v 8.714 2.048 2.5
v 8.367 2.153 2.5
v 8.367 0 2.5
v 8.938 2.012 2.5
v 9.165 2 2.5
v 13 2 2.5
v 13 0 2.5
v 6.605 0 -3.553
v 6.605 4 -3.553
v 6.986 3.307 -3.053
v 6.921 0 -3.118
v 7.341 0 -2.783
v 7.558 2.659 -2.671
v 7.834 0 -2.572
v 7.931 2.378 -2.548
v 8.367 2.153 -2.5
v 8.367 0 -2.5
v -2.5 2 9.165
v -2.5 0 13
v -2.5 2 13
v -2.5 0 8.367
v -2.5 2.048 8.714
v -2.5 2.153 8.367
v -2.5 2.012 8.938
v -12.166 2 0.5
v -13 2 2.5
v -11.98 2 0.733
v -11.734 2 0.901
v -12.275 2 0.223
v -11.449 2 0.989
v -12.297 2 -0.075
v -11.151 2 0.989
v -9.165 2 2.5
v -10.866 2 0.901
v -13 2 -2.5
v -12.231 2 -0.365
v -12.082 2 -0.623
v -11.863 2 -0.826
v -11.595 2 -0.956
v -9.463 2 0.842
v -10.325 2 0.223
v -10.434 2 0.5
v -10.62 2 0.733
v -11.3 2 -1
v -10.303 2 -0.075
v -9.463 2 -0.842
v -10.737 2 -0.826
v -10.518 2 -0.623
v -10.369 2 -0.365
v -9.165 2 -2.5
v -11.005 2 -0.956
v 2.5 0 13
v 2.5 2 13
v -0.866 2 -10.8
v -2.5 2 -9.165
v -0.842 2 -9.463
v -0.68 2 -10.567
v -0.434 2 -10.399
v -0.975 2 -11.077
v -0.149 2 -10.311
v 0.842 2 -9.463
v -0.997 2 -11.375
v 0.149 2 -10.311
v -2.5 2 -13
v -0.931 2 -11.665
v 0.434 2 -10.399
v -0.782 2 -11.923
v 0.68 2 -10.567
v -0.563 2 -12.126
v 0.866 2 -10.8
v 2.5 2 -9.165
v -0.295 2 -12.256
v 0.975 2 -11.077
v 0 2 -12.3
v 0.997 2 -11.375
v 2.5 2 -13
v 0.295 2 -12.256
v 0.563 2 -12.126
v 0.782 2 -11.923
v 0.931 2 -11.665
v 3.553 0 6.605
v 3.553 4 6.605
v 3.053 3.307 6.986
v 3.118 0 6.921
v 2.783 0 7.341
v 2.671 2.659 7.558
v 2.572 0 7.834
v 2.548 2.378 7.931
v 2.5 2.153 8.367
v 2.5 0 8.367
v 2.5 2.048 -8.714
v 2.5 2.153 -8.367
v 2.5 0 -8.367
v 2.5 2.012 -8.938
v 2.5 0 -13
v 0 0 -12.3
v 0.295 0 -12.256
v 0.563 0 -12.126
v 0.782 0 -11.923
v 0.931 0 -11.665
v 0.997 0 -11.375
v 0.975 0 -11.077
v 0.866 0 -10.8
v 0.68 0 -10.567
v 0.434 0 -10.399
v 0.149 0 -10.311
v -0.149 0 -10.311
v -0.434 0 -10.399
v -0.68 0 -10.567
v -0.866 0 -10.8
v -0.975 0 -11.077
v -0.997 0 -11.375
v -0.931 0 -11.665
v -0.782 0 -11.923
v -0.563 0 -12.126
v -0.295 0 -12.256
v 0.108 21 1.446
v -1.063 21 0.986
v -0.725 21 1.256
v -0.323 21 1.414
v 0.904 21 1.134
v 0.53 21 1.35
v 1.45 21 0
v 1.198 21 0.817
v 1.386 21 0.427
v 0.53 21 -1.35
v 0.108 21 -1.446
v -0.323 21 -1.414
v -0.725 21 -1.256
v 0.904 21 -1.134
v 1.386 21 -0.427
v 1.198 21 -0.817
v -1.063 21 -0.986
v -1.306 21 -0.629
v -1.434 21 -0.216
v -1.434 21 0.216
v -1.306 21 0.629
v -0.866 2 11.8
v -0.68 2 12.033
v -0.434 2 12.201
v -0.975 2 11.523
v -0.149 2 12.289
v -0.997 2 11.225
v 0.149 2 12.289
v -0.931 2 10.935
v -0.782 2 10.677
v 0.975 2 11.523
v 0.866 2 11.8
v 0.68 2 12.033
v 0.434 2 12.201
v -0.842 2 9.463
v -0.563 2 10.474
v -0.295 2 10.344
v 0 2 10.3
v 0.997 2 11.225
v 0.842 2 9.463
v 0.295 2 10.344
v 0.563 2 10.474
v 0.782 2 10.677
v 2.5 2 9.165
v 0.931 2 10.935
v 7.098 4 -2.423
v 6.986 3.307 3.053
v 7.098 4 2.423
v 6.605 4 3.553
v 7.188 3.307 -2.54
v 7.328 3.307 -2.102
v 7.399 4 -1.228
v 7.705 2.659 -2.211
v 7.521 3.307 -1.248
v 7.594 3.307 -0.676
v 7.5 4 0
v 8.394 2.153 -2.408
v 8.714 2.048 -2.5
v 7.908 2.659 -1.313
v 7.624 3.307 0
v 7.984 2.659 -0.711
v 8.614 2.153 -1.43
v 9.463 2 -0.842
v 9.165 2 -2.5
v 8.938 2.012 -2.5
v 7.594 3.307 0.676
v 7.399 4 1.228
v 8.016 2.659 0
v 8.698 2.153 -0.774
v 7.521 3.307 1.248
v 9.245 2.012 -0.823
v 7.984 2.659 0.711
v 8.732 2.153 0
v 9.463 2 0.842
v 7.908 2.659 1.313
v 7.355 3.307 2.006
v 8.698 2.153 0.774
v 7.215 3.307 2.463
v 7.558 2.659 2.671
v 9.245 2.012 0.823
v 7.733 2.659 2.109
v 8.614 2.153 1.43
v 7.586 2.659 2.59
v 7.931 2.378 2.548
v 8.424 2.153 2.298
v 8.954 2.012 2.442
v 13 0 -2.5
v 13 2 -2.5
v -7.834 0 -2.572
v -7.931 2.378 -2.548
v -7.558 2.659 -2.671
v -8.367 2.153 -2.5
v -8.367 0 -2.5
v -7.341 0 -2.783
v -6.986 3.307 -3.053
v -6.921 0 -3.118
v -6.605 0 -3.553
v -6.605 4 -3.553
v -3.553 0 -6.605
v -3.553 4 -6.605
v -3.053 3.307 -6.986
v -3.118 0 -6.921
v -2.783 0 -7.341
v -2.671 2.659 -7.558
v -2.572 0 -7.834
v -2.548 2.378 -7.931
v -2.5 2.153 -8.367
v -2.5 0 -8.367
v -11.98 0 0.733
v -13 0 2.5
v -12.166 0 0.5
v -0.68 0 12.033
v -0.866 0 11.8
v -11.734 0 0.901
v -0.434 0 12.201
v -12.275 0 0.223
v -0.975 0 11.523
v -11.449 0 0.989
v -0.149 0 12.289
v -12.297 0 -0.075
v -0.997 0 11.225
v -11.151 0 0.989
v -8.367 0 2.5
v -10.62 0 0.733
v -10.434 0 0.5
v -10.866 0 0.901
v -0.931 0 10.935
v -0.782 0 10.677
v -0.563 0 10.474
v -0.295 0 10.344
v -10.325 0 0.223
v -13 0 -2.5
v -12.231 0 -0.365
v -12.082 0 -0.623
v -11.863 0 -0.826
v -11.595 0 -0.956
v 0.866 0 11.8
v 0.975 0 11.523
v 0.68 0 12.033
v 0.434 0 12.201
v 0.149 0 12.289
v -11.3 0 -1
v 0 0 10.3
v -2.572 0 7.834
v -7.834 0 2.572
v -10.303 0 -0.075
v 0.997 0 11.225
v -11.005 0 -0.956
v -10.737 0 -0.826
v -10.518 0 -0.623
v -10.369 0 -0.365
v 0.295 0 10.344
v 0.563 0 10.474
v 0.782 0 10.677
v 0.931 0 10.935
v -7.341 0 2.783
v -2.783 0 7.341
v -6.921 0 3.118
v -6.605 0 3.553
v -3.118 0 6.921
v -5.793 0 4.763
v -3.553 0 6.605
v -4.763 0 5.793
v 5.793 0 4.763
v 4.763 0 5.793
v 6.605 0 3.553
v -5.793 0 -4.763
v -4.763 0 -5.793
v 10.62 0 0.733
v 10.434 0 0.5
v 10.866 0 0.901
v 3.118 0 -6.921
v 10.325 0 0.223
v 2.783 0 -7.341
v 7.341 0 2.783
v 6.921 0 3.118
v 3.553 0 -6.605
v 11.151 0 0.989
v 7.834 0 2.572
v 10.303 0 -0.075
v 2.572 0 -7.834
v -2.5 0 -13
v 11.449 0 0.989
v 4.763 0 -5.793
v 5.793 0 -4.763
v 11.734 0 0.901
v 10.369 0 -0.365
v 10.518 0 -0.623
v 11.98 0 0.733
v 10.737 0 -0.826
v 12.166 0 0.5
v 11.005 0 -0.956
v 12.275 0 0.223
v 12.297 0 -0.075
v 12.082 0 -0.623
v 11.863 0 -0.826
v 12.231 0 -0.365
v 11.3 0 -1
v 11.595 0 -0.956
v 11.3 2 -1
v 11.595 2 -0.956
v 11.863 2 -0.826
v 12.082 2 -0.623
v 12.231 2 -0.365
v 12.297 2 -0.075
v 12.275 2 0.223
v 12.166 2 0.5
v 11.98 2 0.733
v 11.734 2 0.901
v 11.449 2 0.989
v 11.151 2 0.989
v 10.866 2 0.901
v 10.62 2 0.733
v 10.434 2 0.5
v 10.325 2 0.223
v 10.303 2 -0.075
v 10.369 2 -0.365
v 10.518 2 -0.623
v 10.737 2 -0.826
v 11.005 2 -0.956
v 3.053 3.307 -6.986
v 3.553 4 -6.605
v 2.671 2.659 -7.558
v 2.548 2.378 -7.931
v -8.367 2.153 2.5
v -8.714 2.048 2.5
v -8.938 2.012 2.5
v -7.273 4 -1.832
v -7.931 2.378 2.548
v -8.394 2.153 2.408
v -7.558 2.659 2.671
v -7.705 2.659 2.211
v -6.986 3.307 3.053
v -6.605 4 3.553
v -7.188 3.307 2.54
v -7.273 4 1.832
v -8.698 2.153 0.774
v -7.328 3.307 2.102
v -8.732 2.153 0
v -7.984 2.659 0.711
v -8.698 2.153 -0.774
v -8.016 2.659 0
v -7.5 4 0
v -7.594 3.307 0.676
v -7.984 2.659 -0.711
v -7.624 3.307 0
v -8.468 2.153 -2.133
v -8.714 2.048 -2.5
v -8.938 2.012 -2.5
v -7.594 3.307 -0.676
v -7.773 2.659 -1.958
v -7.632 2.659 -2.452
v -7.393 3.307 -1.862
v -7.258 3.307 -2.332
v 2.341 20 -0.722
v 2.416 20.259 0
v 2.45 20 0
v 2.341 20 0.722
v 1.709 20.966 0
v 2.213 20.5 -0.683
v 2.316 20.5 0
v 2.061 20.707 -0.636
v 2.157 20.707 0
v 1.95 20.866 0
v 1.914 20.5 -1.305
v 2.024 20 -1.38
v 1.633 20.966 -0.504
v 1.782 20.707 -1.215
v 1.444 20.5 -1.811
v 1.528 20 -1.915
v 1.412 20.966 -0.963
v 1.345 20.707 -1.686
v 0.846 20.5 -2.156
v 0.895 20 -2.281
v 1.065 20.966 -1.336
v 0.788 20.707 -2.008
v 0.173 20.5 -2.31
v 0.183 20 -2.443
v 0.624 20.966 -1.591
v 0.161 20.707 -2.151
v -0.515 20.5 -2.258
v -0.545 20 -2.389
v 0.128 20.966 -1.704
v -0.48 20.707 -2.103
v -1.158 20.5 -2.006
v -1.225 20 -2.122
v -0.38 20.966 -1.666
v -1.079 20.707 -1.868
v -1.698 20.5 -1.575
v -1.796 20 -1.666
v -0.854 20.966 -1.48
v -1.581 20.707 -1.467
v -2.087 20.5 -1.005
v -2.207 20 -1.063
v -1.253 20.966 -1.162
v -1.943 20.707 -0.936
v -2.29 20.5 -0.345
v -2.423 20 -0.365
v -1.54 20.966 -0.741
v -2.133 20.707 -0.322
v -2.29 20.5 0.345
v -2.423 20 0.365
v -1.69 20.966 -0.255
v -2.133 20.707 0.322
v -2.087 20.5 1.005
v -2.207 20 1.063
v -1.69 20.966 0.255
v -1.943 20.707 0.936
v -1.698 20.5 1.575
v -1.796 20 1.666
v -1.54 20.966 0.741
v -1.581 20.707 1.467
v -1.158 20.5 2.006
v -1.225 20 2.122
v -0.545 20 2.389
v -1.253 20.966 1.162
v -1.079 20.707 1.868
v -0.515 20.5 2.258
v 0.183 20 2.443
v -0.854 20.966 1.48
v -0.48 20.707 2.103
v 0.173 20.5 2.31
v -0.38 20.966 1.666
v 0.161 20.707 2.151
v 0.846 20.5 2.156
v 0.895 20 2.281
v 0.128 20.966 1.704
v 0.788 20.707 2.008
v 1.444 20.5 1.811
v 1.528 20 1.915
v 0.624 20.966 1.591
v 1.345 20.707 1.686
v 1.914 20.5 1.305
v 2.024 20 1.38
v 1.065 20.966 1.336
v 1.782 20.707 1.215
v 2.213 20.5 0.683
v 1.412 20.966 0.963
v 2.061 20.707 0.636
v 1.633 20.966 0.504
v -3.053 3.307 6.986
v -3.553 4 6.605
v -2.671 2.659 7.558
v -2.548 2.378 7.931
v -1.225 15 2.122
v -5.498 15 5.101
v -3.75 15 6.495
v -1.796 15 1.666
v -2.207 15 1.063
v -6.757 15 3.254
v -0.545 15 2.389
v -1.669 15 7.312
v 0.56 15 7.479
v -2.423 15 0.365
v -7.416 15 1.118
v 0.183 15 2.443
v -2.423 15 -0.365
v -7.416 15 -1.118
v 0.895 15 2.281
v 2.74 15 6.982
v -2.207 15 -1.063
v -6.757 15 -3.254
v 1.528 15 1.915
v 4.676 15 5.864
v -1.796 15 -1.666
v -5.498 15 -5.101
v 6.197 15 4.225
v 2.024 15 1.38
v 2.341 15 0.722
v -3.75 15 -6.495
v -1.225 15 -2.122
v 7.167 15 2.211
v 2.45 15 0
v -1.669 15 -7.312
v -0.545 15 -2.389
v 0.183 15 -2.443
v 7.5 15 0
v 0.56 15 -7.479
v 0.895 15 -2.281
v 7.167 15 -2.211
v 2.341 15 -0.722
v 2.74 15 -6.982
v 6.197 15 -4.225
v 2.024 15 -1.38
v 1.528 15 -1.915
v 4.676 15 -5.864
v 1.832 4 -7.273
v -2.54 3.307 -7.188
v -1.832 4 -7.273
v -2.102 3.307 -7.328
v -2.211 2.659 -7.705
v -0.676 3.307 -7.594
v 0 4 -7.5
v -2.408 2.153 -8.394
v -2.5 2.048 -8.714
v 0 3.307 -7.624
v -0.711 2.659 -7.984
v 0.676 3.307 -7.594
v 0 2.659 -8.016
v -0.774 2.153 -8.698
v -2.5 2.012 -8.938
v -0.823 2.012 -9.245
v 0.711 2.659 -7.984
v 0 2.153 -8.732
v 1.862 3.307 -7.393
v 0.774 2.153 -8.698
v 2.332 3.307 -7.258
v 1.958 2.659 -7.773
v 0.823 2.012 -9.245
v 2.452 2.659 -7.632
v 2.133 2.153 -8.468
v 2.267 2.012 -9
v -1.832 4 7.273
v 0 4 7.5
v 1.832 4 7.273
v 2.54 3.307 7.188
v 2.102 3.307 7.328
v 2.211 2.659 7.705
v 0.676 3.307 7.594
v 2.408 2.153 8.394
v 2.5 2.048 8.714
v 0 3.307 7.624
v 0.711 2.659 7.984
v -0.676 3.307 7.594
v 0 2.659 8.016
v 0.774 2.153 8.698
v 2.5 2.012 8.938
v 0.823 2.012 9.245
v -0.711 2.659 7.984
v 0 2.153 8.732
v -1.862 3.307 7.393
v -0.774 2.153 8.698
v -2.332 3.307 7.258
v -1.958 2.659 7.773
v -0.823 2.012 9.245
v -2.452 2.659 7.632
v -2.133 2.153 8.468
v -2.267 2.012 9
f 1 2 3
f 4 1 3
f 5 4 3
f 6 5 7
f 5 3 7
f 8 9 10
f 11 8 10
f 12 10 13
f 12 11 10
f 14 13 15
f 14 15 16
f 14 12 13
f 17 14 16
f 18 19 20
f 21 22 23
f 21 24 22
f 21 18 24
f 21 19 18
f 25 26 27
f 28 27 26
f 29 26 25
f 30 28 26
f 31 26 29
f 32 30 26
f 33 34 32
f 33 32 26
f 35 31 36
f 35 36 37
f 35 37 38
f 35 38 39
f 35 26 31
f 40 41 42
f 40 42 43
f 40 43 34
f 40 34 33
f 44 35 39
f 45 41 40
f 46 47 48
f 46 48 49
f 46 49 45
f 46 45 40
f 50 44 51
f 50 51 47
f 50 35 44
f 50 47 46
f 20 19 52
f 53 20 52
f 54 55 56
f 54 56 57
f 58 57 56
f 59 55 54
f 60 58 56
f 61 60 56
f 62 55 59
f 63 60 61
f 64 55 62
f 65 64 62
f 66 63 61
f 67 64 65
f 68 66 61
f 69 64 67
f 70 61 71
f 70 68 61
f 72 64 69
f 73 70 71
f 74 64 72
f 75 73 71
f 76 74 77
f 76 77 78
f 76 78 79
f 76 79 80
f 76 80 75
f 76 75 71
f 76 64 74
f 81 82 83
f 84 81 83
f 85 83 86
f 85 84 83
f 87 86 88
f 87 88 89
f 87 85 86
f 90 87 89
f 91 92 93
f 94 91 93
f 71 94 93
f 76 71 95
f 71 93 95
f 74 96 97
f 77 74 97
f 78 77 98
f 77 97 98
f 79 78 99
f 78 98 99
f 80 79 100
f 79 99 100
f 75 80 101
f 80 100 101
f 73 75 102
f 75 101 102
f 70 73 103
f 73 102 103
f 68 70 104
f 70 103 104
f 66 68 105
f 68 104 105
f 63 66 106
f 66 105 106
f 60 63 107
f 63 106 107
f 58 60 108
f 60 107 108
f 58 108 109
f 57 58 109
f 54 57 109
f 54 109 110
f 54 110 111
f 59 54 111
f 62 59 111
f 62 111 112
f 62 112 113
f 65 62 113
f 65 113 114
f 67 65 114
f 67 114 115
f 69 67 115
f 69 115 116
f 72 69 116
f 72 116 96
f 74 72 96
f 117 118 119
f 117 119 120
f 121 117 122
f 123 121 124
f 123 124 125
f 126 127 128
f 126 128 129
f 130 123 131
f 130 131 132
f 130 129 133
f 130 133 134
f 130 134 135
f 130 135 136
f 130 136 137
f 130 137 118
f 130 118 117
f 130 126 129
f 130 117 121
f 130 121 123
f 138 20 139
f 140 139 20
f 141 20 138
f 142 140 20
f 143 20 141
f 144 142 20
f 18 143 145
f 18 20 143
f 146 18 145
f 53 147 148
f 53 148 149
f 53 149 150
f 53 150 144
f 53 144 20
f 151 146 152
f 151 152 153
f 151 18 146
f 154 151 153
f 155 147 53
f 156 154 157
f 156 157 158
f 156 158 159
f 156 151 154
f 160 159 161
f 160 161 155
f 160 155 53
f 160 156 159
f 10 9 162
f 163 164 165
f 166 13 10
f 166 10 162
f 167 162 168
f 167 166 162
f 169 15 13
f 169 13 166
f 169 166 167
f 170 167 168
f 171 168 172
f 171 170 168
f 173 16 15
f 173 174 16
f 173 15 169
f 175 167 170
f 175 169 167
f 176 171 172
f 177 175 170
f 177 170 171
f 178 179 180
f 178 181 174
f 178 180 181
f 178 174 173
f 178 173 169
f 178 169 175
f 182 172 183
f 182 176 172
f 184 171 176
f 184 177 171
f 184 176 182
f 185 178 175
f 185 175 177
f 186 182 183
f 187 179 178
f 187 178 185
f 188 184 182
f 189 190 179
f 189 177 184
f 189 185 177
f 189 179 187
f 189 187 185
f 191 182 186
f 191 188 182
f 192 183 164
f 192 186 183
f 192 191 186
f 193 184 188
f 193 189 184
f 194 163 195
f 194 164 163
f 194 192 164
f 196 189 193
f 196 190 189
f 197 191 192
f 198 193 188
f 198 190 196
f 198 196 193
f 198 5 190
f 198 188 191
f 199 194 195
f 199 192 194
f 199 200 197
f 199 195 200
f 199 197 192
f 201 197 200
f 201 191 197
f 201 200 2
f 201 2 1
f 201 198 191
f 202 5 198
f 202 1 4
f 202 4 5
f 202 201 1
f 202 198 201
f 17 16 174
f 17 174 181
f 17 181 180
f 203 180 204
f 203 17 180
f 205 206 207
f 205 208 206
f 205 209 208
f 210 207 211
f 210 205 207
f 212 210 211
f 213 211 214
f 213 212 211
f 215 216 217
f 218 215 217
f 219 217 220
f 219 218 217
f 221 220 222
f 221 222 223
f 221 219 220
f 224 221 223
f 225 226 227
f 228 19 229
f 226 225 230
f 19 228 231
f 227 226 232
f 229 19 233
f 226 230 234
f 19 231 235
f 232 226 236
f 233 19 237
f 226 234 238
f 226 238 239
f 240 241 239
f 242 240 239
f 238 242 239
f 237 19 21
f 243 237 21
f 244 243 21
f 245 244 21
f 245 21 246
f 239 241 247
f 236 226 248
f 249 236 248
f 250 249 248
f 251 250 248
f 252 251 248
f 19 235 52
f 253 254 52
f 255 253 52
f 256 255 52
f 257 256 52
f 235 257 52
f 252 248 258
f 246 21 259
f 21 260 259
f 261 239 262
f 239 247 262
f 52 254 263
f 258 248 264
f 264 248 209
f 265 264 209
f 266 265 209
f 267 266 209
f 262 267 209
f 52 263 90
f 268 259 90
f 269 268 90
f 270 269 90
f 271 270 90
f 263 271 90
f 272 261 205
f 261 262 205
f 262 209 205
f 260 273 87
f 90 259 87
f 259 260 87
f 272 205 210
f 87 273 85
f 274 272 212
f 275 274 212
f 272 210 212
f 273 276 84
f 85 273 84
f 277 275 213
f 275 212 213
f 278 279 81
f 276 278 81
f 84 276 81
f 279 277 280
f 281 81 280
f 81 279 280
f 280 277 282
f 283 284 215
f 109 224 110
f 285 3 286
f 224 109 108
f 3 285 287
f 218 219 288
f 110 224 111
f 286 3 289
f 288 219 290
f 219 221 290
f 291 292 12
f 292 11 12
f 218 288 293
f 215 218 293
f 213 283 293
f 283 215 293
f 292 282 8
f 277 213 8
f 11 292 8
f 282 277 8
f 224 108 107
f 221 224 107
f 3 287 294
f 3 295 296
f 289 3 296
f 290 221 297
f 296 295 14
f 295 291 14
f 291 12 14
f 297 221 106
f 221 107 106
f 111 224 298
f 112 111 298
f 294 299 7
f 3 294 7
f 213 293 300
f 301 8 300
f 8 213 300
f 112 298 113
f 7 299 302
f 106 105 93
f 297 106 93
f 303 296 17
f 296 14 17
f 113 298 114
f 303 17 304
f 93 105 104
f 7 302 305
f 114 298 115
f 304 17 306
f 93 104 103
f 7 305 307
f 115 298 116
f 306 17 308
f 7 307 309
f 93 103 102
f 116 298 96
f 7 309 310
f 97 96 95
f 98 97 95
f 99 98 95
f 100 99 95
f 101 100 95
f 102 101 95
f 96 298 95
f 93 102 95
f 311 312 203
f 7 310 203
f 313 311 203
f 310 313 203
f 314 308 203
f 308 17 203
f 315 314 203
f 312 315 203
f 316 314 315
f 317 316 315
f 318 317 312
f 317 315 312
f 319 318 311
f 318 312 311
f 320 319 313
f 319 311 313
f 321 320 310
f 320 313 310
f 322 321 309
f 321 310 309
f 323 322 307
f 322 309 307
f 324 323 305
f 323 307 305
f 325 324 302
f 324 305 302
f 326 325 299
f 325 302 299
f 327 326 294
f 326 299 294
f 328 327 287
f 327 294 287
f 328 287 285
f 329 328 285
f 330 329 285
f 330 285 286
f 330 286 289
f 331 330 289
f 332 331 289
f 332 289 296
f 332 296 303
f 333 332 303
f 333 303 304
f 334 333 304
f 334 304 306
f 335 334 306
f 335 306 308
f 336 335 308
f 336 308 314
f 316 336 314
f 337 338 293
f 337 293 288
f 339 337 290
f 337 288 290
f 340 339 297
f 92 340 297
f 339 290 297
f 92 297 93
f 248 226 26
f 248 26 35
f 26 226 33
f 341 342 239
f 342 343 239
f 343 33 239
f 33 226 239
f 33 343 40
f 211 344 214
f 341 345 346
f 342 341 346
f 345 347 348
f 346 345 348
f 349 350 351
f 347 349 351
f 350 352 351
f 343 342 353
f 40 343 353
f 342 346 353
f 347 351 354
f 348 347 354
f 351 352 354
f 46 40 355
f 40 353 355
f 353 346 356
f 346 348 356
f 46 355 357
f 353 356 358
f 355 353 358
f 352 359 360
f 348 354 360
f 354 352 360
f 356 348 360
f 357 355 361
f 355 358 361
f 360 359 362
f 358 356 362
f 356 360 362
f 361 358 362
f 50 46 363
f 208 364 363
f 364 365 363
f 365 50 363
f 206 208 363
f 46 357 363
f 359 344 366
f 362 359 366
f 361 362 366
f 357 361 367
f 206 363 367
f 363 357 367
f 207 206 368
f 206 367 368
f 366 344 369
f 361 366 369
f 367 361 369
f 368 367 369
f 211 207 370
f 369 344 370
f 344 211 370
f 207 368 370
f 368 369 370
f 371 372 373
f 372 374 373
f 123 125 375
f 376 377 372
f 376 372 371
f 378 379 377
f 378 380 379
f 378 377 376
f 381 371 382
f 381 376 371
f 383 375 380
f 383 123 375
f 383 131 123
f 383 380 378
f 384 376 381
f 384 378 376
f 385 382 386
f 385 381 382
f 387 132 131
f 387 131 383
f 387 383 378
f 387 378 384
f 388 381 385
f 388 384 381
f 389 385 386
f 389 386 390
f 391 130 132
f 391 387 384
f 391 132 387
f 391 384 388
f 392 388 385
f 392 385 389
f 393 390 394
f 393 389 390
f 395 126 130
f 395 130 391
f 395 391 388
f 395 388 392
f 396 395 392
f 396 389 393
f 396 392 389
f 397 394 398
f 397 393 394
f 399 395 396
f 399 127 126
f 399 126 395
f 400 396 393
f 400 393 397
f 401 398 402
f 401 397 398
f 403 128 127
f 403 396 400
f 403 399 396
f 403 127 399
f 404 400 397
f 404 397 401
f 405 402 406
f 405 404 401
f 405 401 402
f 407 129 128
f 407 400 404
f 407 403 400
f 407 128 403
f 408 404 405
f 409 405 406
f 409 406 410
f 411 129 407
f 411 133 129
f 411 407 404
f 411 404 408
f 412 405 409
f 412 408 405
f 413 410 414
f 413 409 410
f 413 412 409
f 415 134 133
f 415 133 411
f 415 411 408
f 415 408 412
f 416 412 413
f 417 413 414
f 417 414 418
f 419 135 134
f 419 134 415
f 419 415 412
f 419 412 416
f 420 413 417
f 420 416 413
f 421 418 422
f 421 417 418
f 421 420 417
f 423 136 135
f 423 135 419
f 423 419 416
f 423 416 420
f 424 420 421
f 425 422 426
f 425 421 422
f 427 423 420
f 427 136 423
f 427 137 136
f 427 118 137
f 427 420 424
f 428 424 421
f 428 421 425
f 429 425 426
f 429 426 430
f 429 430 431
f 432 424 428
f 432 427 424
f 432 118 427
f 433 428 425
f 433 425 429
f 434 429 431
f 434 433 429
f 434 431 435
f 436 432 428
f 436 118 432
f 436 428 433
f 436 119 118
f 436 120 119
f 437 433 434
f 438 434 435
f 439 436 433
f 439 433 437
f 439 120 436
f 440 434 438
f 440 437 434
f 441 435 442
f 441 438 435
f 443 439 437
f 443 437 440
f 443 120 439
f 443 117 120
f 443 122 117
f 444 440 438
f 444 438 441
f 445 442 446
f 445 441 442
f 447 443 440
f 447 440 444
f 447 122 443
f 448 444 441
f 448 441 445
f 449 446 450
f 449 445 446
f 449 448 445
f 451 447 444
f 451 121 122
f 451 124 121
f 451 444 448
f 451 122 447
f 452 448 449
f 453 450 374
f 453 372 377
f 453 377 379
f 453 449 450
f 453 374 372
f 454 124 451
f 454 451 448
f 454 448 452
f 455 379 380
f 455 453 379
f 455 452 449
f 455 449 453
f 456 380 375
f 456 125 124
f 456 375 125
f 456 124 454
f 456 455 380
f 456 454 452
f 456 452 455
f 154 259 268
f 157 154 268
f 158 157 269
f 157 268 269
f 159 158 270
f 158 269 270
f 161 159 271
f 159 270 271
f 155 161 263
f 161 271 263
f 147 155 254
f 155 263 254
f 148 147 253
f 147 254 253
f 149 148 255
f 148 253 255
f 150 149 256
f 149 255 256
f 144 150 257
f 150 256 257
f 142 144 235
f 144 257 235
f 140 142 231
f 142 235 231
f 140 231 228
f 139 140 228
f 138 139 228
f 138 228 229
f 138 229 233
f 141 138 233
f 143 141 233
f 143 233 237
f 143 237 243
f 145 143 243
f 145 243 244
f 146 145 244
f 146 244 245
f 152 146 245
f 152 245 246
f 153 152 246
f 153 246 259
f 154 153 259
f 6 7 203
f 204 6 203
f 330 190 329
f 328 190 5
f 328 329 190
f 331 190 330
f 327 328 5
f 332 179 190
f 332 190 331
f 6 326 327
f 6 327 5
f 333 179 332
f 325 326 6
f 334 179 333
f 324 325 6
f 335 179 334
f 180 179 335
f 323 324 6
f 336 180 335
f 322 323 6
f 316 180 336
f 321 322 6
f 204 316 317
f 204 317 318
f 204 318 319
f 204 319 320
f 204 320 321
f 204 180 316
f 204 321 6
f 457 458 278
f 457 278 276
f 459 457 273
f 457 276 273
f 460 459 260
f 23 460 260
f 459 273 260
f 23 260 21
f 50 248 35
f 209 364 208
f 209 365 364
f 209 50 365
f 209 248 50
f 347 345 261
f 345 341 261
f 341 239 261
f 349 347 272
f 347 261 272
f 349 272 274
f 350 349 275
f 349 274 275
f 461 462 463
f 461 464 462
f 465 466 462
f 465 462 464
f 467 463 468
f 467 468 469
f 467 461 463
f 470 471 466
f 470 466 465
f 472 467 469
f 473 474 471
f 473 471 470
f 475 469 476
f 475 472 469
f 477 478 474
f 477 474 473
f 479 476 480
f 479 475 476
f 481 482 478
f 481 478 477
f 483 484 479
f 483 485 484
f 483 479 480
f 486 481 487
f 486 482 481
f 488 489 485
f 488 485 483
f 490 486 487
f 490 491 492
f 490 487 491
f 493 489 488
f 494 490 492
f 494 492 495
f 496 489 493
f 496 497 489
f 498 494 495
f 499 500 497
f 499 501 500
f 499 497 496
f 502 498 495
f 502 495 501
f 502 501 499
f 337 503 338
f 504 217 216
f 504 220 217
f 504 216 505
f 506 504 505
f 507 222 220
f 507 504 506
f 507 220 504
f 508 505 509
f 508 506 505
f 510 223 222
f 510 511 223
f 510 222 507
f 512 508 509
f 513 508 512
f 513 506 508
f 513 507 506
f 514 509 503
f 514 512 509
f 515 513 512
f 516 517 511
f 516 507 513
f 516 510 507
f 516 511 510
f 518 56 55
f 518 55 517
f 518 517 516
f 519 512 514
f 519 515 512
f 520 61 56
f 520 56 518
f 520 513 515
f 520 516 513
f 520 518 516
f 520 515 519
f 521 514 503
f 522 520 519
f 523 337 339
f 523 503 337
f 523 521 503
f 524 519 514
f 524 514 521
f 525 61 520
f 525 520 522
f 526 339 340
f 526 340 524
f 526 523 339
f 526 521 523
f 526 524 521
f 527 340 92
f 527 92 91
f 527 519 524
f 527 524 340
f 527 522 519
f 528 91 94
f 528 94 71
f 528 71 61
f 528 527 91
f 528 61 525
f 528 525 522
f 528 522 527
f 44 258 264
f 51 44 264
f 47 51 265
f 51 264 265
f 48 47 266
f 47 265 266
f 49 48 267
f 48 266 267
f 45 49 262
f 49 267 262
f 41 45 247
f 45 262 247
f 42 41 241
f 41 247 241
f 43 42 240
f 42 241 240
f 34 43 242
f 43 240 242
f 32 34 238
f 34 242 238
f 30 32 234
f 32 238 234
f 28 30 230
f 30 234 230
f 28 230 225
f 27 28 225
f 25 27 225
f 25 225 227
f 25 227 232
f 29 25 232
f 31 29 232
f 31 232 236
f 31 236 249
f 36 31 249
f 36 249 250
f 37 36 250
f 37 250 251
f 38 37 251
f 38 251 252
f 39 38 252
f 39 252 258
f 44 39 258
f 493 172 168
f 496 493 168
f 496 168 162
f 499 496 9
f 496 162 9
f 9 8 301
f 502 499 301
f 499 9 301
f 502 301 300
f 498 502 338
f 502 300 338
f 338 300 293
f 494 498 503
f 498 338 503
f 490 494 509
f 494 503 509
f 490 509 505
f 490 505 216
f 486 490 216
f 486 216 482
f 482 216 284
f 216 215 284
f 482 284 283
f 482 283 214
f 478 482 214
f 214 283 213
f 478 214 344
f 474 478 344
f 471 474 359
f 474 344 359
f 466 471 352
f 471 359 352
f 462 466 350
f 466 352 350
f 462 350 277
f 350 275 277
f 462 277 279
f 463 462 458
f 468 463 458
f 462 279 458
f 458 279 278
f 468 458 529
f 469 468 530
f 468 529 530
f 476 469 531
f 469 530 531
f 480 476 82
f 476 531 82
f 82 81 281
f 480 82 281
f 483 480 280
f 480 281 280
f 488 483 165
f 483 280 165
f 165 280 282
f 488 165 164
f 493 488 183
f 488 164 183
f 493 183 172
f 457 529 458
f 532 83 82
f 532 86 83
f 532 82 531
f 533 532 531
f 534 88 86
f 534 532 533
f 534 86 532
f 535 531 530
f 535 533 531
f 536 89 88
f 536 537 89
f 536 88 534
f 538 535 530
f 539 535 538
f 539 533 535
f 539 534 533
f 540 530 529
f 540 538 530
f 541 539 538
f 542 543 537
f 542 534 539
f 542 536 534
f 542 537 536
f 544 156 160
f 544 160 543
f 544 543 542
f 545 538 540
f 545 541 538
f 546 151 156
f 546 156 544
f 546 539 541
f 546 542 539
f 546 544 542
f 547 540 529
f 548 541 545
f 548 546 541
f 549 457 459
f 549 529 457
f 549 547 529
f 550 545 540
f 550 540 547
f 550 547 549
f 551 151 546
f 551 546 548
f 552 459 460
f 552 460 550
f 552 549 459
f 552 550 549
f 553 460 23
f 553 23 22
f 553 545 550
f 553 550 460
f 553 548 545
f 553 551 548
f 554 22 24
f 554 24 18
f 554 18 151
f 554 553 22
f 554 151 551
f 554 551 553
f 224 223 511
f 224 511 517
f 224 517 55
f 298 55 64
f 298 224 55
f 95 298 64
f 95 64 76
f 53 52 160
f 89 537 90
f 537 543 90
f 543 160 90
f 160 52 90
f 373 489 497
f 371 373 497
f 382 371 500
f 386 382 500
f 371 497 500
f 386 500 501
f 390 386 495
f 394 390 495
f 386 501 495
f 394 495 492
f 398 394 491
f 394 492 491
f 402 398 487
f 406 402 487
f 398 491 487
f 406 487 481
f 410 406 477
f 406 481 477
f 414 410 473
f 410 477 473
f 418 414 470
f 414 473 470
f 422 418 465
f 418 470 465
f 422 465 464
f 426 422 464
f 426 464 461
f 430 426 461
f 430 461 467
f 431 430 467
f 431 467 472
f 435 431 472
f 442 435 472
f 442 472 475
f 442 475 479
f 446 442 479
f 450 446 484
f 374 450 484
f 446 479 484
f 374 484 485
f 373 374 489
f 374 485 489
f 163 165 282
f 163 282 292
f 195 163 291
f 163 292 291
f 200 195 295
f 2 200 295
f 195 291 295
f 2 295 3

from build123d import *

# Parameters (mm, degrees)
SKETCH1_R             = 7.5
BOSS_EXTRUDE1_DEPTH   = 15
SKETCH2_R             = 2.45
BOSS_EXTRUDE2_DEPTH   = 6
SKETCH3_W             = 10.5
SKETCH3_H             = 5
SKETCH3_W_2           = 5
SKETCH3_H_2           = 10.5
BOSS_EXTRUDE3_DEPTH   = 2
FILLET1_R             = 2
F_2_0MM_DOWEL_HOLE1_D = 2
FILLET2_R             = 1


with BuildPart() as part:
    # Sketch1 → Boss-Extrude1 (new body)
    with BuildSketch(Plane(origin=(0, 0, 0), x_dir=(1, 0, 0), z_dir=(0, 1, 0))):
        Circle(SKETCH1_R)
    extrude(amount=BOSS_EXTRUDE1_DEPTH)

    # Sketch2 → Boss-Extrude2 (add)
    with BuildSketch(Plane(origin=(0, 15, 0), x_dir=(1, 0, 0), z_dir=(0, 1, 0))):
        Circle(SKETCH2_R)
    extrude(amount=BOSS_EXTRUDE2_DEPTH)

    # Sketch3 → Boss-Extrude3 (add)
    with BuildSketch(Plane(origin=(0, 0, 0), x_dir=(1, 0, 0), z_dir=(0, 1, 0))):
        with Locations((-7.75, 0)):
            Rectangle(SKETCH3_W, SKETCH3_H)
        with Locations((0, -7.75)):
            Rectangle(SKETCH3_W_2, SKETCH3_H_2)
        with Locations((7.75, 0)):
            Rectangle(SKETCH3_W, SKETCH3_H)
        with Locations((0, 7.75)):
            Rectangle(SKETCH3_W_2, SKETCH3_H_2)
    extrude(amount=BOSS_EXTRUDE3_DEPTH)

    # Fillet1
    fillet1_edges = [part.edges().sort_by_distance(p)[0] for p in [
        (-7.5, 2, 0),
        (-7.071067812, 1, 2.5),
        (-7.071067812, 1, -2.5),
        (0, 2, 7.5),
        (-2.5, 1, 7.071067812),
        (2.5, 1, 7.071067812),
        (7.391989197, 2, -1.26826484),
        (7.071067812, 1, 2.5),
        (7.071067812, 1, -2.5),
        (0, 2, -7.5),
        (-2.5, 1, -7.071067812),
        (2.5, 1, -7.071067812),
    ]]
    fillet(fillet1_edges, radius=FILLET1_R)

    # Ø2.0mm Dowel Hole1 (through all)
    with Locations(Plane(origin=(-11.3, 2, 0), x_dir=(0, 0, 1), z_dir=(0, 1, 0))):
        with Locations((0, 0), (-11.3, 11.3), (0, 22.6), (11.3, 11.3)):
            Hole(F_2_0MM_DOWEL_HOLE1_D / 2)

    # Fillet2
    fillet2_edges = [part.edges().sort_by_distance(p)[0] for p in [
        (-2.45, 21, 0),
    ]]
    fillet(fillet2_edges, radius=FILLET2_R)


solid = part.part
